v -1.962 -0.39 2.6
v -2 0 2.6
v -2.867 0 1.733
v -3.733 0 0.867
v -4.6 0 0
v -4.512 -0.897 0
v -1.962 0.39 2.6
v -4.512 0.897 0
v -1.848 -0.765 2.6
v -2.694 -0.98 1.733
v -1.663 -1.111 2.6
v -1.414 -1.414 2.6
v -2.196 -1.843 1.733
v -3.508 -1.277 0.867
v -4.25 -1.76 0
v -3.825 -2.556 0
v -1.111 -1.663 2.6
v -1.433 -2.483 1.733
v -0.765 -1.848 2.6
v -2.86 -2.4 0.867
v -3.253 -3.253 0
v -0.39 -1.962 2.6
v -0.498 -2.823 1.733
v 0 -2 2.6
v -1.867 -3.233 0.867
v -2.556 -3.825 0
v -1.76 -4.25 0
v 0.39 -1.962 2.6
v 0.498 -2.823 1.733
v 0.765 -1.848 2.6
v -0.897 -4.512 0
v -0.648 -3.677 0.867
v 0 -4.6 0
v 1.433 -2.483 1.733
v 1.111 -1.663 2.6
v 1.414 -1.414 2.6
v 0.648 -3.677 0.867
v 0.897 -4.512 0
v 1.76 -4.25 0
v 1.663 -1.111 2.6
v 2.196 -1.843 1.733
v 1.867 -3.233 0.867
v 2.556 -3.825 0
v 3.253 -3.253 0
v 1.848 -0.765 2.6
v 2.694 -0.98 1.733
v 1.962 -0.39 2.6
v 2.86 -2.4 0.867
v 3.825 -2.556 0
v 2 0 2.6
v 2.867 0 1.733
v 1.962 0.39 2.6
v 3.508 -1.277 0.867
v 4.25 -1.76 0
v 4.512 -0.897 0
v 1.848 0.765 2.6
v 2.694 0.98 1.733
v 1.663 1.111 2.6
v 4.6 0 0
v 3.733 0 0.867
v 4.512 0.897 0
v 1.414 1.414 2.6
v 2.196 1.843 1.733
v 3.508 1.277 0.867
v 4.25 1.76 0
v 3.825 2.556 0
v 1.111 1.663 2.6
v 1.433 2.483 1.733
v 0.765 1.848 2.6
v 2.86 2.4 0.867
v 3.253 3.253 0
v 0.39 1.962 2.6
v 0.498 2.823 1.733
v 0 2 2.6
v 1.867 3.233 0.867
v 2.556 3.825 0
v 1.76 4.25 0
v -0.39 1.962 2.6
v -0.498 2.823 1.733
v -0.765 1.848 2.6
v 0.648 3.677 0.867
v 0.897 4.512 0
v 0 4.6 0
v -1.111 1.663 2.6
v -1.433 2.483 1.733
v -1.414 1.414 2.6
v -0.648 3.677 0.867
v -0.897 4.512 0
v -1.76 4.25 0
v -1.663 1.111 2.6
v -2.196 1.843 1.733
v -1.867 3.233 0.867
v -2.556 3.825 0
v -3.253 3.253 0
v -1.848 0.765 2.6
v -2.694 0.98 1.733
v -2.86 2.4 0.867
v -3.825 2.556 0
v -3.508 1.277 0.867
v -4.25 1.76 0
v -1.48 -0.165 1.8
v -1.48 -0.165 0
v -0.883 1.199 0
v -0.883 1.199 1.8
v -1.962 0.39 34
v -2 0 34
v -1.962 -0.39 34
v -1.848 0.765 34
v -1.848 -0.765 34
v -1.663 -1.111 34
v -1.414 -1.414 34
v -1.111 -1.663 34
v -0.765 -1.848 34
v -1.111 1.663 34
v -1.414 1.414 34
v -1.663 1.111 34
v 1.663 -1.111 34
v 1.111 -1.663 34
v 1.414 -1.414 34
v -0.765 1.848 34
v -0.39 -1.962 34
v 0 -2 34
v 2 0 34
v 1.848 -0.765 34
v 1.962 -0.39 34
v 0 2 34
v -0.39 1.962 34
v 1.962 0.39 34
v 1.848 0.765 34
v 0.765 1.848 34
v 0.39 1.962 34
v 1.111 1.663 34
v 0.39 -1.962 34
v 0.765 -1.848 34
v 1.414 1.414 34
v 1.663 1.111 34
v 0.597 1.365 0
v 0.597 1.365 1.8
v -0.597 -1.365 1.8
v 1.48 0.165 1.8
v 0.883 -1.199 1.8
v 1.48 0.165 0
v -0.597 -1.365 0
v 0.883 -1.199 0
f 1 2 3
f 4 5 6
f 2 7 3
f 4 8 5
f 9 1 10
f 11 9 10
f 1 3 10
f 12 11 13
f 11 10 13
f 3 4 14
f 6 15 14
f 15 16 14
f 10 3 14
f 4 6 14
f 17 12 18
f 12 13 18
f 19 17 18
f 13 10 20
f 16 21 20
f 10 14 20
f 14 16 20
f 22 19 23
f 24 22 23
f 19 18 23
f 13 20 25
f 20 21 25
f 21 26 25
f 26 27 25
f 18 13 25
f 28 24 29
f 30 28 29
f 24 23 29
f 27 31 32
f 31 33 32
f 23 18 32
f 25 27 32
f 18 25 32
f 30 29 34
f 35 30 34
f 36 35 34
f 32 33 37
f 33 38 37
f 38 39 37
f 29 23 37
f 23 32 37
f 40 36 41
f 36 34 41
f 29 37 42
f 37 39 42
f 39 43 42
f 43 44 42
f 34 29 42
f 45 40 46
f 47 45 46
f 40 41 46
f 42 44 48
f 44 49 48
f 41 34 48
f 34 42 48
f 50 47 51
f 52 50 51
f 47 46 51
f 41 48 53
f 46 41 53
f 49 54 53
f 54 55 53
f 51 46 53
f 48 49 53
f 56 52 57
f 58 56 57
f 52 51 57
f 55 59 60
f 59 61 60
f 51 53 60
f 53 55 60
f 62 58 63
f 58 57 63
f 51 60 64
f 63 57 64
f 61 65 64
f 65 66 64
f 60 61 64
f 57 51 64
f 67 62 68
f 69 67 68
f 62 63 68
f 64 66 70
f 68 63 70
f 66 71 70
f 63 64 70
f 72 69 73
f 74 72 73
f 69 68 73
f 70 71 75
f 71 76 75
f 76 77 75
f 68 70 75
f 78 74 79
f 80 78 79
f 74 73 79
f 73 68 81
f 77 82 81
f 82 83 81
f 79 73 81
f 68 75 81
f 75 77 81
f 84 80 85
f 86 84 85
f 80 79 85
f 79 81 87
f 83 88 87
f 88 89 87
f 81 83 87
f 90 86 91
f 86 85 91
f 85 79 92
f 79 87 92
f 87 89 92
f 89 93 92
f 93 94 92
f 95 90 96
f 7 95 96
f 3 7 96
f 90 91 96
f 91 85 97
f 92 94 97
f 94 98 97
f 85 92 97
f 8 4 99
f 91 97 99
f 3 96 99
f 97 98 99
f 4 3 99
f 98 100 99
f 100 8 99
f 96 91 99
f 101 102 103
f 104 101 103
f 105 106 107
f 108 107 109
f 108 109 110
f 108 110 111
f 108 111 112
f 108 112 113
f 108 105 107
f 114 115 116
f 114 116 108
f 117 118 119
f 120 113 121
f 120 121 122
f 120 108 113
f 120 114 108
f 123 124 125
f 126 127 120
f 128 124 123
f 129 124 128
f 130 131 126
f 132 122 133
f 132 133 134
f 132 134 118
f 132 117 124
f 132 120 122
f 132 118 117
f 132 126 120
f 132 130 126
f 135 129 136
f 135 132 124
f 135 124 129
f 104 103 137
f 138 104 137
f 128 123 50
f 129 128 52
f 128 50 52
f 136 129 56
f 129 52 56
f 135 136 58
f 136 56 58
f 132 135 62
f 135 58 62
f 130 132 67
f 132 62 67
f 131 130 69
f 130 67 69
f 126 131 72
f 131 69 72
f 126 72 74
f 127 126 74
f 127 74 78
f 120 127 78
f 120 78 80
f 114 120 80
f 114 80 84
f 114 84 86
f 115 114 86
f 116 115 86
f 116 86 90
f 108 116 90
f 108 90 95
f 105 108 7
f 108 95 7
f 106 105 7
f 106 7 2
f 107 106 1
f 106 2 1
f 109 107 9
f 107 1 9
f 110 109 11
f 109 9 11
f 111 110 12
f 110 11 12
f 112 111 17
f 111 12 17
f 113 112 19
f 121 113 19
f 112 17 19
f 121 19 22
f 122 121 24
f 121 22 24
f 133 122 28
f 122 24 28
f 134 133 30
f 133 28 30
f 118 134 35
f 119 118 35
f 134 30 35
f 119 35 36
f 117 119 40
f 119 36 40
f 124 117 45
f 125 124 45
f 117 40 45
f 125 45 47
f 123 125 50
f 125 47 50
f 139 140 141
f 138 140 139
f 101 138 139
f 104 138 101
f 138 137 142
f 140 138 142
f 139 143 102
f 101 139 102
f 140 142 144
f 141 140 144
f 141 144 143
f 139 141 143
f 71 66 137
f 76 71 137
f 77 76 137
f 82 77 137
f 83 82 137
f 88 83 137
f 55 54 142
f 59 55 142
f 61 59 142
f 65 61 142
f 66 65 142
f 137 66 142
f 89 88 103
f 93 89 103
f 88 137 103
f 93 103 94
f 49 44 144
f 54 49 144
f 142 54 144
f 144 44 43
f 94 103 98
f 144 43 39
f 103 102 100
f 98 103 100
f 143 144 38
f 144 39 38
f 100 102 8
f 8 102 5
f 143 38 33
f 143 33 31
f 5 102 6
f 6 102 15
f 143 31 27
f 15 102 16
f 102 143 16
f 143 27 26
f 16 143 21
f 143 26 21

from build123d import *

# Parameters (mm, degrees)
SKETCH_1_R          = 2
EXTRUDE_1_DEPTH     = 34
CUT_EXTRUDE_1_DEPTH = 1.8


with BuildPart() as part:
    # 草图1 → 凸台-拉伸1 (new body)
    with BuildSketch(Plane.XY):
        Circle(SKETCH_1_R)
    extrude(amount=EXTRUDE_1_DEPTH)

    # 草图2 → 旋转1 (revolve)
    with BuildSketch(Plane(origin=(0, 0, 0), x_dir=(1, 0, 0), z_dir=(0, 1, 0)), mode=Mode.PRIVATE) as revolve_1_sk:
        Polygon((2, 0), (2, -2.6), (4.6, 0), align=None)
    revolve(revolve_1_sk.sketch.rotate(Axis((0, 0, 0), (0, 0, 1)), 180), axis=Axis((0, 0, 0), (0, 0, 1)))

    # 草图3 → 切除-拉伸1 (cut)
    with BuildSketch(Plane(origin=(0, 0, 0), x_dir=(-1, 0, 0), z_dir=(0, 0, -1))):
        Polygon((-0.59701127, 1.364689541), (-1.480361446, 0.165317844), (-0.883350176, -1.199371697), (0.59701127, -1.364689541), (1.480361446, -0.165317844), (0.883350176, 1.199371697), align=None)
    extrude(amount=-CUT_EXTRUDE_1_DEPTH, mode=Mode.SUBTRACT)


solid = part.part
